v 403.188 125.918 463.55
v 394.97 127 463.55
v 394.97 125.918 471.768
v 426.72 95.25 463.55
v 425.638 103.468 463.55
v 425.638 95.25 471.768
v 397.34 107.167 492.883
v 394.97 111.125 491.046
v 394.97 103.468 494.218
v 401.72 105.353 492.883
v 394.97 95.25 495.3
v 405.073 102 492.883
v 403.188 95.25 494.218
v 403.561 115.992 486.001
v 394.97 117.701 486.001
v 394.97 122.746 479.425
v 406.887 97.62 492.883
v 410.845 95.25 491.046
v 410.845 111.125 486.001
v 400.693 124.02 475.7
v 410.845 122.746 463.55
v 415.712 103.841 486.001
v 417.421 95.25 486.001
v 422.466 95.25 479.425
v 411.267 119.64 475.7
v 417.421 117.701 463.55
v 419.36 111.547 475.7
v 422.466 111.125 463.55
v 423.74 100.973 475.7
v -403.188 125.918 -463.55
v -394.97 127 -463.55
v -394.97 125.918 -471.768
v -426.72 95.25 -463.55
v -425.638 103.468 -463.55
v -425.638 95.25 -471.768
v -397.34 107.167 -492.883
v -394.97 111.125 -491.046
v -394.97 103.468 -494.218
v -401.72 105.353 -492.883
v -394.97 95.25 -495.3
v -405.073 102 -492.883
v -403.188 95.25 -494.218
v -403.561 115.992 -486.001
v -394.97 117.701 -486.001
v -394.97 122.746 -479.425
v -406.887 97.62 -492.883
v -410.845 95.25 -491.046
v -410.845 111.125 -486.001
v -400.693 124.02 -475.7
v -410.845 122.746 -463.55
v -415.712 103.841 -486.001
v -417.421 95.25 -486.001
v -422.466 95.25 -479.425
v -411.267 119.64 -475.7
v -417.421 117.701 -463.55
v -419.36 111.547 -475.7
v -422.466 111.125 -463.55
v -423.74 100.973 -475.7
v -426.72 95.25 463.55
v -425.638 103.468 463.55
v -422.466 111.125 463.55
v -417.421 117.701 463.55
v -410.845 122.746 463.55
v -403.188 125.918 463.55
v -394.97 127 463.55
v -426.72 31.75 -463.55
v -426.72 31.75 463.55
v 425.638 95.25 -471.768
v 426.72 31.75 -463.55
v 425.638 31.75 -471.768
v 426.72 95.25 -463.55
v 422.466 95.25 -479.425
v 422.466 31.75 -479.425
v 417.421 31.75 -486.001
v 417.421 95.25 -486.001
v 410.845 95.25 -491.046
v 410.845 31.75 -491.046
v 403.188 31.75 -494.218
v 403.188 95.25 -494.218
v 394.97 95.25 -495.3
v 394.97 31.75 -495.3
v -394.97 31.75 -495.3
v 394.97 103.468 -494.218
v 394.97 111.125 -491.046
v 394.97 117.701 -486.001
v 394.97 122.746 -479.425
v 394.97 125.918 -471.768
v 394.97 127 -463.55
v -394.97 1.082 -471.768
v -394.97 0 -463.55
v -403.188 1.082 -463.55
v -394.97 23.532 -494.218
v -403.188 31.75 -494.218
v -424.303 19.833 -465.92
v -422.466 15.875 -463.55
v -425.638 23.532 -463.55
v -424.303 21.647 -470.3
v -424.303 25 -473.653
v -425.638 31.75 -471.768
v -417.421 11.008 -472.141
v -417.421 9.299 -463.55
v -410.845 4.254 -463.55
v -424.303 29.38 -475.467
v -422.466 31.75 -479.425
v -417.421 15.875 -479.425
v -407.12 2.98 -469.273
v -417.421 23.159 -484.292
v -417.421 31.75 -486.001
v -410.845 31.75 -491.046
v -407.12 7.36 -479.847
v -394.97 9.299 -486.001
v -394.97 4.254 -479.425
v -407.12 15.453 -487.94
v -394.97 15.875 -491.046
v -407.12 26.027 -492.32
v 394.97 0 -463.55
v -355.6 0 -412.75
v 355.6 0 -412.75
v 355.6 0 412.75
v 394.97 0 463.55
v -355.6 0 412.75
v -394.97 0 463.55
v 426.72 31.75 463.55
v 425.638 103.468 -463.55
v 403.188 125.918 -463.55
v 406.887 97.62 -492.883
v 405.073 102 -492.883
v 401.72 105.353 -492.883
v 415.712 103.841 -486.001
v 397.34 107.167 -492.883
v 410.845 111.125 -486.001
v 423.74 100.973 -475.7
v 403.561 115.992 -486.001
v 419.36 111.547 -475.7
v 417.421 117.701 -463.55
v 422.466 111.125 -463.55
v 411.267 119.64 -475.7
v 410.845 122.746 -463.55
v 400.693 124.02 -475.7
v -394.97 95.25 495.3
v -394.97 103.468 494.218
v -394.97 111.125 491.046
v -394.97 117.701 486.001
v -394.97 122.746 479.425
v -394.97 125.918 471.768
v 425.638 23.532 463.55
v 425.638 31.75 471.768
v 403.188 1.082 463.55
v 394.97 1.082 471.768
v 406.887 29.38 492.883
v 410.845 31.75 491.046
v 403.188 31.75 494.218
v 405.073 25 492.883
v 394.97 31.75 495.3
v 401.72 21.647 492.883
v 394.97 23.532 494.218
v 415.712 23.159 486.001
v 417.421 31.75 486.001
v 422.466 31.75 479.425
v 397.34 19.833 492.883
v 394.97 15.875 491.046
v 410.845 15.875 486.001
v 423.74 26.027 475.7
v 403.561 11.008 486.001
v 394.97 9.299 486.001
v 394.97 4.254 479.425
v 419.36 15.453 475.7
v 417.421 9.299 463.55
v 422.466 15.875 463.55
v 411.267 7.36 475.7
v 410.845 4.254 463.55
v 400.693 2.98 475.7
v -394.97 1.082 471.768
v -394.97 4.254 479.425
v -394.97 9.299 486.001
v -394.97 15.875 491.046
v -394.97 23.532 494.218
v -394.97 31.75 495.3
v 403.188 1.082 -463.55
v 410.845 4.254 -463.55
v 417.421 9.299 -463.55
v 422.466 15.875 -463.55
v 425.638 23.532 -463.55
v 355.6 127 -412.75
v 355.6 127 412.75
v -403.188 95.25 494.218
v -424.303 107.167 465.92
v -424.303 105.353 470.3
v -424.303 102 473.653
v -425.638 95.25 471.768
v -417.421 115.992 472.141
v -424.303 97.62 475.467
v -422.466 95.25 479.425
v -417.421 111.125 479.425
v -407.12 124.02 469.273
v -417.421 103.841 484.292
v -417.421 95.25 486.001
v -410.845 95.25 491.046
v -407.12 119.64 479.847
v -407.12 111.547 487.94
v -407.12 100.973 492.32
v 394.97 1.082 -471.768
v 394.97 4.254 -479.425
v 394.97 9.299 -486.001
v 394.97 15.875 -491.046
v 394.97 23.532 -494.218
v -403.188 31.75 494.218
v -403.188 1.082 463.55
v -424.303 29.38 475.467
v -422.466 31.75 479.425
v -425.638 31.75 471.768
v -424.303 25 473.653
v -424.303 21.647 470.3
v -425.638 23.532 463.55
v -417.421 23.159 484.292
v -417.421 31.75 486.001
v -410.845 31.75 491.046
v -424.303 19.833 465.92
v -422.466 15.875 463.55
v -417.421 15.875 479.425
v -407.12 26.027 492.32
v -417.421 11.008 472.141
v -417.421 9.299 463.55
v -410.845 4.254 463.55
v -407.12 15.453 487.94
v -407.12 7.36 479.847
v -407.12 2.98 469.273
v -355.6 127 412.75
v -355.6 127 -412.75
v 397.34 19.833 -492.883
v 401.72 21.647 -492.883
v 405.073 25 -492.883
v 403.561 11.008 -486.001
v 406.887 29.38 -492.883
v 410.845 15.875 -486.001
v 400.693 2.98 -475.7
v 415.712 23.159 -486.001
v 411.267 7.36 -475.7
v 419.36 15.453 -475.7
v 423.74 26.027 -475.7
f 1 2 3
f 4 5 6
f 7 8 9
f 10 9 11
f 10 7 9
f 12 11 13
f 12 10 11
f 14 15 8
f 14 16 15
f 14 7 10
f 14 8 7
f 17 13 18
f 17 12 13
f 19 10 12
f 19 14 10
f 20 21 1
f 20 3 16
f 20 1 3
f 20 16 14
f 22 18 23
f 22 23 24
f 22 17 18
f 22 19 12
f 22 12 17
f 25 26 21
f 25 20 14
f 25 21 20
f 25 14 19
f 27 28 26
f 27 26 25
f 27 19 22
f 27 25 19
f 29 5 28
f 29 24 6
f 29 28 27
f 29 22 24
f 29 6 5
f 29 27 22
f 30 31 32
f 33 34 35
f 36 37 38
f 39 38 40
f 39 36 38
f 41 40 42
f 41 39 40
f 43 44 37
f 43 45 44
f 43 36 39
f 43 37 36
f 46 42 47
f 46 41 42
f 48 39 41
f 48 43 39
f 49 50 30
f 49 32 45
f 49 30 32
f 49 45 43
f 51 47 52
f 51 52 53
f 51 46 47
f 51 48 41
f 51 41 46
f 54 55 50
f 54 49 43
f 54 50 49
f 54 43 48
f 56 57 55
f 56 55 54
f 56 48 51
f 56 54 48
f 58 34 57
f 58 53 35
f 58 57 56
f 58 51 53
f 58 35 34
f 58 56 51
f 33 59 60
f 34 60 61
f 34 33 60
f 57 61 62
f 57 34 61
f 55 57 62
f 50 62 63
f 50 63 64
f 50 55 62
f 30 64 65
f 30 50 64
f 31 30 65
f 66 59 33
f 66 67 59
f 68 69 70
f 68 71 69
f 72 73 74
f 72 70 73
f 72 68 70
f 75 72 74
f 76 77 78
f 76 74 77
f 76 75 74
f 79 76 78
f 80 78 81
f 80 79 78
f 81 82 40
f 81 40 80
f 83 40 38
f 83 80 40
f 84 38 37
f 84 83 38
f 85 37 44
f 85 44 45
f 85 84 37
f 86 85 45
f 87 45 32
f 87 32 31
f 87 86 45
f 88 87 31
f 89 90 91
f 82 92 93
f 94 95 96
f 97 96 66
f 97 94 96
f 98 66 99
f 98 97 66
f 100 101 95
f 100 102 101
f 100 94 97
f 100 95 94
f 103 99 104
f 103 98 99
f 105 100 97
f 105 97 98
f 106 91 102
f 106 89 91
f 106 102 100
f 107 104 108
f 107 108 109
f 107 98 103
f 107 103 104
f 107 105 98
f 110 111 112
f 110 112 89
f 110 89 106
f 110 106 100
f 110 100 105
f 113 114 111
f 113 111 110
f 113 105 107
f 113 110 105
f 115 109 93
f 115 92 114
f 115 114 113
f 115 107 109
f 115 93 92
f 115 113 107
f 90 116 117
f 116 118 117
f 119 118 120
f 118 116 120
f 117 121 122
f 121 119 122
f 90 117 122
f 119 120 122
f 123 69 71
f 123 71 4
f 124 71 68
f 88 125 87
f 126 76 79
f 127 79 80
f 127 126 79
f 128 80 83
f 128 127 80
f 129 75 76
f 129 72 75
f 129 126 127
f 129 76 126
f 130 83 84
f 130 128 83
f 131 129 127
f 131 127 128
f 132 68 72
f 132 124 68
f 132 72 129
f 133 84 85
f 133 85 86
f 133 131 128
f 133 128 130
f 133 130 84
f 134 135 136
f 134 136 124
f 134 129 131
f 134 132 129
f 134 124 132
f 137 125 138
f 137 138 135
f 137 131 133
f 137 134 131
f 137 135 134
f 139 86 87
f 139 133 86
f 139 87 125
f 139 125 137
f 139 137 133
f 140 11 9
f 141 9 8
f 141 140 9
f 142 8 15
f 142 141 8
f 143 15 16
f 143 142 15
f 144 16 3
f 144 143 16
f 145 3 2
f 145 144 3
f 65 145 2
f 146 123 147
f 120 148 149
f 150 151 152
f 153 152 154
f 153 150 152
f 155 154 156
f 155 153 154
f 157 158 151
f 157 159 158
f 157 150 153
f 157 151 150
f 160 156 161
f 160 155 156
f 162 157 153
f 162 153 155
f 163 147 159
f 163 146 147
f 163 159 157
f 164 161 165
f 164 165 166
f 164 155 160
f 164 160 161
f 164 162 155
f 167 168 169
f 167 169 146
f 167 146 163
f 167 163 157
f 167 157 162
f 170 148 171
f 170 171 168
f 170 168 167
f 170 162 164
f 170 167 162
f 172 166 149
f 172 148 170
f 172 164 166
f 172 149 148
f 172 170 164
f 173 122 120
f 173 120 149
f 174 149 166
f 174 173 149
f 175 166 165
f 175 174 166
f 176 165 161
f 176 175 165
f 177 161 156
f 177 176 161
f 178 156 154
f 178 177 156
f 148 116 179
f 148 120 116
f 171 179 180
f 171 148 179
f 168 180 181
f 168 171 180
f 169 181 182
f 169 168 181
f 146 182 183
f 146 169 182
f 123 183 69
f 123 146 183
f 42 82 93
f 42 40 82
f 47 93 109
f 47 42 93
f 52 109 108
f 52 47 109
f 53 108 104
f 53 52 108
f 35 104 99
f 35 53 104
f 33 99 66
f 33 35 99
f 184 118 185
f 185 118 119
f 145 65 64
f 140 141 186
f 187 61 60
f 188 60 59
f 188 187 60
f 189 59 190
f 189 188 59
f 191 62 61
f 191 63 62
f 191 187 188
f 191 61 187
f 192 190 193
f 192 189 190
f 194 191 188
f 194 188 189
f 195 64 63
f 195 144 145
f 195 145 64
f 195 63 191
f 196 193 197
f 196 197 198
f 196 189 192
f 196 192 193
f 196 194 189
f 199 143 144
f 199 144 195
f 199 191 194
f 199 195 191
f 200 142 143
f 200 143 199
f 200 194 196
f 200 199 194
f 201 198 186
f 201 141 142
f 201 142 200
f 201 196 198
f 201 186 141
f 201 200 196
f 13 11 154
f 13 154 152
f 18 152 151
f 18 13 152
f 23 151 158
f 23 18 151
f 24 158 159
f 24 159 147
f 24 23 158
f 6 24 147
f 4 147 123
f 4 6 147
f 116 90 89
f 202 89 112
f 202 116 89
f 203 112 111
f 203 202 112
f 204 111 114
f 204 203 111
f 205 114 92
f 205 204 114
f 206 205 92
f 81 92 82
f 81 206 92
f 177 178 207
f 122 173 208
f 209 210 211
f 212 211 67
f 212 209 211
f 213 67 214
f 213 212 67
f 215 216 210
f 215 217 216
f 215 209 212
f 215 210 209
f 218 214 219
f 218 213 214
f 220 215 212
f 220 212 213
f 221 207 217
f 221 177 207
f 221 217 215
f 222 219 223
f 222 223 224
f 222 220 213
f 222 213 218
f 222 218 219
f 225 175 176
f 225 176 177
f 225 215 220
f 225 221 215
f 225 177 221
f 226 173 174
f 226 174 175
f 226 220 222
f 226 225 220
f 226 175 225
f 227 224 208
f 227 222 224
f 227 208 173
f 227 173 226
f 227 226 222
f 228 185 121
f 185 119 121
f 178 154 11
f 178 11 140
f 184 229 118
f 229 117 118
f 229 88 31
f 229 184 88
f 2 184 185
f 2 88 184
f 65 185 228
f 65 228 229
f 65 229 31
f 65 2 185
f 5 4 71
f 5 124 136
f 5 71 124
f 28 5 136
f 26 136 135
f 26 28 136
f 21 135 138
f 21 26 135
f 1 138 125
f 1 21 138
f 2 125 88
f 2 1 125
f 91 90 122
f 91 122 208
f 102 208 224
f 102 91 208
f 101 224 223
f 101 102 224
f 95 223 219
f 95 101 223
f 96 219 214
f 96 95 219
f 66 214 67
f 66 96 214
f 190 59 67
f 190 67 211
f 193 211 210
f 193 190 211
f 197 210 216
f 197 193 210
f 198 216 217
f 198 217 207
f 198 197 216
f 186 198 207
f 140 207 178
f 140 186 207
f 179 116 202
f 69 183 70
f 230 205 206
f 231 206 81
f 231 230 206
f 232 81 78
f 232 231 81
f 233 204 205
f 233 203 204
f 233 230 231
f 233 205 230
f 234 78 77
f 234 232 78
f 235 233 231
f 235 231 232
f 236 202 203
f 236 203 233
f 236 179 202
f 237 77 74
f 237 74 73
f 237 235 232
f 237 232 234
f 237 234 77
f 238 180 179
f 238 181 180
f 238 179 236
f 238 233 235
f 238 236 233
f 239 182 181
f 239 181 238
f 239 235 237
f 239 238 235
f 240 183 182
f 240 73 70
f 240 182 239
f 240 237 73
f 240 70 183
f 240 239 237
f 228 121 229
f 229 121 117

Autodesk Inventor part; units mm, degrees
ref_plane "YZ Plane" through (0, 0, 0) normal (1, 0, 0) x (0, 1, 0)
ref_plane "XZ Plane" through (0, 0, 0) normal (0, 1, 0) x (-1, 0, 0)
ref_plane "XY Plane" through (0, 0, 0) normal (0, 0, 1) x (1, 0, 0)
sketch "Sketch1" plane through (0, 0, 0) normal (0, 1, 0) x (-1, 0, 0)
  line L0 (-355.6, 412.75) -> (355.6, 412.75)
  line L1 (355.6, 412.75) -> (355.6, -412.75)
  line L2 (355.6, -412.75) -> (-355.6, -412.75)
  line L3 (-355.6, -412.75) -> (-355.6, 412.75)
  line L4 (-355.6, 412.75) -> (355.6, -412.75) construction
  line L5 (355.6, 412.75) -> (-355.6, -412.75) construction
  line L6 (-426.72, 495.3) -> (426.72, 495.3)
  line L7 (426.72, 495.3) -> (426.72, -495.3)
  line L8 (426.72, -495.3) -> (-426.72, -495.3)
  line L9 (-426.72, -495.3) -> (-426.72, 495.3)
  line L10 (-426.72, 495.3) -> (426.72, -495.3) construction
  line L11 (426.72, 495.3) -> (-426.72, -495.3) construction
  point P0 (0, 0)
  dimension "d0" = 825.5
  dimension "d1" = 711.2
  dimension "d2" = 82.55
extrude "Extrusion1" add sketch "Sketch1" along normal blind 127
fillet "Fillet1" radius 31.75 12 edges at (426.72, 127, 0) (0, 127, 495.3) (-426.72, 127, 0) (0, 127, -495.3) (426.72, 0, 0) (0, 0, 495.3) (0, 0, -495.3) (426.72, 63.5, -495.3) (426.72, 63.5, 495.3) (-426.72, 63.5, -495.3) (-426.72, 0, 0) (-426.72, 63.5, 495.3)
properties part number "bumpers"
